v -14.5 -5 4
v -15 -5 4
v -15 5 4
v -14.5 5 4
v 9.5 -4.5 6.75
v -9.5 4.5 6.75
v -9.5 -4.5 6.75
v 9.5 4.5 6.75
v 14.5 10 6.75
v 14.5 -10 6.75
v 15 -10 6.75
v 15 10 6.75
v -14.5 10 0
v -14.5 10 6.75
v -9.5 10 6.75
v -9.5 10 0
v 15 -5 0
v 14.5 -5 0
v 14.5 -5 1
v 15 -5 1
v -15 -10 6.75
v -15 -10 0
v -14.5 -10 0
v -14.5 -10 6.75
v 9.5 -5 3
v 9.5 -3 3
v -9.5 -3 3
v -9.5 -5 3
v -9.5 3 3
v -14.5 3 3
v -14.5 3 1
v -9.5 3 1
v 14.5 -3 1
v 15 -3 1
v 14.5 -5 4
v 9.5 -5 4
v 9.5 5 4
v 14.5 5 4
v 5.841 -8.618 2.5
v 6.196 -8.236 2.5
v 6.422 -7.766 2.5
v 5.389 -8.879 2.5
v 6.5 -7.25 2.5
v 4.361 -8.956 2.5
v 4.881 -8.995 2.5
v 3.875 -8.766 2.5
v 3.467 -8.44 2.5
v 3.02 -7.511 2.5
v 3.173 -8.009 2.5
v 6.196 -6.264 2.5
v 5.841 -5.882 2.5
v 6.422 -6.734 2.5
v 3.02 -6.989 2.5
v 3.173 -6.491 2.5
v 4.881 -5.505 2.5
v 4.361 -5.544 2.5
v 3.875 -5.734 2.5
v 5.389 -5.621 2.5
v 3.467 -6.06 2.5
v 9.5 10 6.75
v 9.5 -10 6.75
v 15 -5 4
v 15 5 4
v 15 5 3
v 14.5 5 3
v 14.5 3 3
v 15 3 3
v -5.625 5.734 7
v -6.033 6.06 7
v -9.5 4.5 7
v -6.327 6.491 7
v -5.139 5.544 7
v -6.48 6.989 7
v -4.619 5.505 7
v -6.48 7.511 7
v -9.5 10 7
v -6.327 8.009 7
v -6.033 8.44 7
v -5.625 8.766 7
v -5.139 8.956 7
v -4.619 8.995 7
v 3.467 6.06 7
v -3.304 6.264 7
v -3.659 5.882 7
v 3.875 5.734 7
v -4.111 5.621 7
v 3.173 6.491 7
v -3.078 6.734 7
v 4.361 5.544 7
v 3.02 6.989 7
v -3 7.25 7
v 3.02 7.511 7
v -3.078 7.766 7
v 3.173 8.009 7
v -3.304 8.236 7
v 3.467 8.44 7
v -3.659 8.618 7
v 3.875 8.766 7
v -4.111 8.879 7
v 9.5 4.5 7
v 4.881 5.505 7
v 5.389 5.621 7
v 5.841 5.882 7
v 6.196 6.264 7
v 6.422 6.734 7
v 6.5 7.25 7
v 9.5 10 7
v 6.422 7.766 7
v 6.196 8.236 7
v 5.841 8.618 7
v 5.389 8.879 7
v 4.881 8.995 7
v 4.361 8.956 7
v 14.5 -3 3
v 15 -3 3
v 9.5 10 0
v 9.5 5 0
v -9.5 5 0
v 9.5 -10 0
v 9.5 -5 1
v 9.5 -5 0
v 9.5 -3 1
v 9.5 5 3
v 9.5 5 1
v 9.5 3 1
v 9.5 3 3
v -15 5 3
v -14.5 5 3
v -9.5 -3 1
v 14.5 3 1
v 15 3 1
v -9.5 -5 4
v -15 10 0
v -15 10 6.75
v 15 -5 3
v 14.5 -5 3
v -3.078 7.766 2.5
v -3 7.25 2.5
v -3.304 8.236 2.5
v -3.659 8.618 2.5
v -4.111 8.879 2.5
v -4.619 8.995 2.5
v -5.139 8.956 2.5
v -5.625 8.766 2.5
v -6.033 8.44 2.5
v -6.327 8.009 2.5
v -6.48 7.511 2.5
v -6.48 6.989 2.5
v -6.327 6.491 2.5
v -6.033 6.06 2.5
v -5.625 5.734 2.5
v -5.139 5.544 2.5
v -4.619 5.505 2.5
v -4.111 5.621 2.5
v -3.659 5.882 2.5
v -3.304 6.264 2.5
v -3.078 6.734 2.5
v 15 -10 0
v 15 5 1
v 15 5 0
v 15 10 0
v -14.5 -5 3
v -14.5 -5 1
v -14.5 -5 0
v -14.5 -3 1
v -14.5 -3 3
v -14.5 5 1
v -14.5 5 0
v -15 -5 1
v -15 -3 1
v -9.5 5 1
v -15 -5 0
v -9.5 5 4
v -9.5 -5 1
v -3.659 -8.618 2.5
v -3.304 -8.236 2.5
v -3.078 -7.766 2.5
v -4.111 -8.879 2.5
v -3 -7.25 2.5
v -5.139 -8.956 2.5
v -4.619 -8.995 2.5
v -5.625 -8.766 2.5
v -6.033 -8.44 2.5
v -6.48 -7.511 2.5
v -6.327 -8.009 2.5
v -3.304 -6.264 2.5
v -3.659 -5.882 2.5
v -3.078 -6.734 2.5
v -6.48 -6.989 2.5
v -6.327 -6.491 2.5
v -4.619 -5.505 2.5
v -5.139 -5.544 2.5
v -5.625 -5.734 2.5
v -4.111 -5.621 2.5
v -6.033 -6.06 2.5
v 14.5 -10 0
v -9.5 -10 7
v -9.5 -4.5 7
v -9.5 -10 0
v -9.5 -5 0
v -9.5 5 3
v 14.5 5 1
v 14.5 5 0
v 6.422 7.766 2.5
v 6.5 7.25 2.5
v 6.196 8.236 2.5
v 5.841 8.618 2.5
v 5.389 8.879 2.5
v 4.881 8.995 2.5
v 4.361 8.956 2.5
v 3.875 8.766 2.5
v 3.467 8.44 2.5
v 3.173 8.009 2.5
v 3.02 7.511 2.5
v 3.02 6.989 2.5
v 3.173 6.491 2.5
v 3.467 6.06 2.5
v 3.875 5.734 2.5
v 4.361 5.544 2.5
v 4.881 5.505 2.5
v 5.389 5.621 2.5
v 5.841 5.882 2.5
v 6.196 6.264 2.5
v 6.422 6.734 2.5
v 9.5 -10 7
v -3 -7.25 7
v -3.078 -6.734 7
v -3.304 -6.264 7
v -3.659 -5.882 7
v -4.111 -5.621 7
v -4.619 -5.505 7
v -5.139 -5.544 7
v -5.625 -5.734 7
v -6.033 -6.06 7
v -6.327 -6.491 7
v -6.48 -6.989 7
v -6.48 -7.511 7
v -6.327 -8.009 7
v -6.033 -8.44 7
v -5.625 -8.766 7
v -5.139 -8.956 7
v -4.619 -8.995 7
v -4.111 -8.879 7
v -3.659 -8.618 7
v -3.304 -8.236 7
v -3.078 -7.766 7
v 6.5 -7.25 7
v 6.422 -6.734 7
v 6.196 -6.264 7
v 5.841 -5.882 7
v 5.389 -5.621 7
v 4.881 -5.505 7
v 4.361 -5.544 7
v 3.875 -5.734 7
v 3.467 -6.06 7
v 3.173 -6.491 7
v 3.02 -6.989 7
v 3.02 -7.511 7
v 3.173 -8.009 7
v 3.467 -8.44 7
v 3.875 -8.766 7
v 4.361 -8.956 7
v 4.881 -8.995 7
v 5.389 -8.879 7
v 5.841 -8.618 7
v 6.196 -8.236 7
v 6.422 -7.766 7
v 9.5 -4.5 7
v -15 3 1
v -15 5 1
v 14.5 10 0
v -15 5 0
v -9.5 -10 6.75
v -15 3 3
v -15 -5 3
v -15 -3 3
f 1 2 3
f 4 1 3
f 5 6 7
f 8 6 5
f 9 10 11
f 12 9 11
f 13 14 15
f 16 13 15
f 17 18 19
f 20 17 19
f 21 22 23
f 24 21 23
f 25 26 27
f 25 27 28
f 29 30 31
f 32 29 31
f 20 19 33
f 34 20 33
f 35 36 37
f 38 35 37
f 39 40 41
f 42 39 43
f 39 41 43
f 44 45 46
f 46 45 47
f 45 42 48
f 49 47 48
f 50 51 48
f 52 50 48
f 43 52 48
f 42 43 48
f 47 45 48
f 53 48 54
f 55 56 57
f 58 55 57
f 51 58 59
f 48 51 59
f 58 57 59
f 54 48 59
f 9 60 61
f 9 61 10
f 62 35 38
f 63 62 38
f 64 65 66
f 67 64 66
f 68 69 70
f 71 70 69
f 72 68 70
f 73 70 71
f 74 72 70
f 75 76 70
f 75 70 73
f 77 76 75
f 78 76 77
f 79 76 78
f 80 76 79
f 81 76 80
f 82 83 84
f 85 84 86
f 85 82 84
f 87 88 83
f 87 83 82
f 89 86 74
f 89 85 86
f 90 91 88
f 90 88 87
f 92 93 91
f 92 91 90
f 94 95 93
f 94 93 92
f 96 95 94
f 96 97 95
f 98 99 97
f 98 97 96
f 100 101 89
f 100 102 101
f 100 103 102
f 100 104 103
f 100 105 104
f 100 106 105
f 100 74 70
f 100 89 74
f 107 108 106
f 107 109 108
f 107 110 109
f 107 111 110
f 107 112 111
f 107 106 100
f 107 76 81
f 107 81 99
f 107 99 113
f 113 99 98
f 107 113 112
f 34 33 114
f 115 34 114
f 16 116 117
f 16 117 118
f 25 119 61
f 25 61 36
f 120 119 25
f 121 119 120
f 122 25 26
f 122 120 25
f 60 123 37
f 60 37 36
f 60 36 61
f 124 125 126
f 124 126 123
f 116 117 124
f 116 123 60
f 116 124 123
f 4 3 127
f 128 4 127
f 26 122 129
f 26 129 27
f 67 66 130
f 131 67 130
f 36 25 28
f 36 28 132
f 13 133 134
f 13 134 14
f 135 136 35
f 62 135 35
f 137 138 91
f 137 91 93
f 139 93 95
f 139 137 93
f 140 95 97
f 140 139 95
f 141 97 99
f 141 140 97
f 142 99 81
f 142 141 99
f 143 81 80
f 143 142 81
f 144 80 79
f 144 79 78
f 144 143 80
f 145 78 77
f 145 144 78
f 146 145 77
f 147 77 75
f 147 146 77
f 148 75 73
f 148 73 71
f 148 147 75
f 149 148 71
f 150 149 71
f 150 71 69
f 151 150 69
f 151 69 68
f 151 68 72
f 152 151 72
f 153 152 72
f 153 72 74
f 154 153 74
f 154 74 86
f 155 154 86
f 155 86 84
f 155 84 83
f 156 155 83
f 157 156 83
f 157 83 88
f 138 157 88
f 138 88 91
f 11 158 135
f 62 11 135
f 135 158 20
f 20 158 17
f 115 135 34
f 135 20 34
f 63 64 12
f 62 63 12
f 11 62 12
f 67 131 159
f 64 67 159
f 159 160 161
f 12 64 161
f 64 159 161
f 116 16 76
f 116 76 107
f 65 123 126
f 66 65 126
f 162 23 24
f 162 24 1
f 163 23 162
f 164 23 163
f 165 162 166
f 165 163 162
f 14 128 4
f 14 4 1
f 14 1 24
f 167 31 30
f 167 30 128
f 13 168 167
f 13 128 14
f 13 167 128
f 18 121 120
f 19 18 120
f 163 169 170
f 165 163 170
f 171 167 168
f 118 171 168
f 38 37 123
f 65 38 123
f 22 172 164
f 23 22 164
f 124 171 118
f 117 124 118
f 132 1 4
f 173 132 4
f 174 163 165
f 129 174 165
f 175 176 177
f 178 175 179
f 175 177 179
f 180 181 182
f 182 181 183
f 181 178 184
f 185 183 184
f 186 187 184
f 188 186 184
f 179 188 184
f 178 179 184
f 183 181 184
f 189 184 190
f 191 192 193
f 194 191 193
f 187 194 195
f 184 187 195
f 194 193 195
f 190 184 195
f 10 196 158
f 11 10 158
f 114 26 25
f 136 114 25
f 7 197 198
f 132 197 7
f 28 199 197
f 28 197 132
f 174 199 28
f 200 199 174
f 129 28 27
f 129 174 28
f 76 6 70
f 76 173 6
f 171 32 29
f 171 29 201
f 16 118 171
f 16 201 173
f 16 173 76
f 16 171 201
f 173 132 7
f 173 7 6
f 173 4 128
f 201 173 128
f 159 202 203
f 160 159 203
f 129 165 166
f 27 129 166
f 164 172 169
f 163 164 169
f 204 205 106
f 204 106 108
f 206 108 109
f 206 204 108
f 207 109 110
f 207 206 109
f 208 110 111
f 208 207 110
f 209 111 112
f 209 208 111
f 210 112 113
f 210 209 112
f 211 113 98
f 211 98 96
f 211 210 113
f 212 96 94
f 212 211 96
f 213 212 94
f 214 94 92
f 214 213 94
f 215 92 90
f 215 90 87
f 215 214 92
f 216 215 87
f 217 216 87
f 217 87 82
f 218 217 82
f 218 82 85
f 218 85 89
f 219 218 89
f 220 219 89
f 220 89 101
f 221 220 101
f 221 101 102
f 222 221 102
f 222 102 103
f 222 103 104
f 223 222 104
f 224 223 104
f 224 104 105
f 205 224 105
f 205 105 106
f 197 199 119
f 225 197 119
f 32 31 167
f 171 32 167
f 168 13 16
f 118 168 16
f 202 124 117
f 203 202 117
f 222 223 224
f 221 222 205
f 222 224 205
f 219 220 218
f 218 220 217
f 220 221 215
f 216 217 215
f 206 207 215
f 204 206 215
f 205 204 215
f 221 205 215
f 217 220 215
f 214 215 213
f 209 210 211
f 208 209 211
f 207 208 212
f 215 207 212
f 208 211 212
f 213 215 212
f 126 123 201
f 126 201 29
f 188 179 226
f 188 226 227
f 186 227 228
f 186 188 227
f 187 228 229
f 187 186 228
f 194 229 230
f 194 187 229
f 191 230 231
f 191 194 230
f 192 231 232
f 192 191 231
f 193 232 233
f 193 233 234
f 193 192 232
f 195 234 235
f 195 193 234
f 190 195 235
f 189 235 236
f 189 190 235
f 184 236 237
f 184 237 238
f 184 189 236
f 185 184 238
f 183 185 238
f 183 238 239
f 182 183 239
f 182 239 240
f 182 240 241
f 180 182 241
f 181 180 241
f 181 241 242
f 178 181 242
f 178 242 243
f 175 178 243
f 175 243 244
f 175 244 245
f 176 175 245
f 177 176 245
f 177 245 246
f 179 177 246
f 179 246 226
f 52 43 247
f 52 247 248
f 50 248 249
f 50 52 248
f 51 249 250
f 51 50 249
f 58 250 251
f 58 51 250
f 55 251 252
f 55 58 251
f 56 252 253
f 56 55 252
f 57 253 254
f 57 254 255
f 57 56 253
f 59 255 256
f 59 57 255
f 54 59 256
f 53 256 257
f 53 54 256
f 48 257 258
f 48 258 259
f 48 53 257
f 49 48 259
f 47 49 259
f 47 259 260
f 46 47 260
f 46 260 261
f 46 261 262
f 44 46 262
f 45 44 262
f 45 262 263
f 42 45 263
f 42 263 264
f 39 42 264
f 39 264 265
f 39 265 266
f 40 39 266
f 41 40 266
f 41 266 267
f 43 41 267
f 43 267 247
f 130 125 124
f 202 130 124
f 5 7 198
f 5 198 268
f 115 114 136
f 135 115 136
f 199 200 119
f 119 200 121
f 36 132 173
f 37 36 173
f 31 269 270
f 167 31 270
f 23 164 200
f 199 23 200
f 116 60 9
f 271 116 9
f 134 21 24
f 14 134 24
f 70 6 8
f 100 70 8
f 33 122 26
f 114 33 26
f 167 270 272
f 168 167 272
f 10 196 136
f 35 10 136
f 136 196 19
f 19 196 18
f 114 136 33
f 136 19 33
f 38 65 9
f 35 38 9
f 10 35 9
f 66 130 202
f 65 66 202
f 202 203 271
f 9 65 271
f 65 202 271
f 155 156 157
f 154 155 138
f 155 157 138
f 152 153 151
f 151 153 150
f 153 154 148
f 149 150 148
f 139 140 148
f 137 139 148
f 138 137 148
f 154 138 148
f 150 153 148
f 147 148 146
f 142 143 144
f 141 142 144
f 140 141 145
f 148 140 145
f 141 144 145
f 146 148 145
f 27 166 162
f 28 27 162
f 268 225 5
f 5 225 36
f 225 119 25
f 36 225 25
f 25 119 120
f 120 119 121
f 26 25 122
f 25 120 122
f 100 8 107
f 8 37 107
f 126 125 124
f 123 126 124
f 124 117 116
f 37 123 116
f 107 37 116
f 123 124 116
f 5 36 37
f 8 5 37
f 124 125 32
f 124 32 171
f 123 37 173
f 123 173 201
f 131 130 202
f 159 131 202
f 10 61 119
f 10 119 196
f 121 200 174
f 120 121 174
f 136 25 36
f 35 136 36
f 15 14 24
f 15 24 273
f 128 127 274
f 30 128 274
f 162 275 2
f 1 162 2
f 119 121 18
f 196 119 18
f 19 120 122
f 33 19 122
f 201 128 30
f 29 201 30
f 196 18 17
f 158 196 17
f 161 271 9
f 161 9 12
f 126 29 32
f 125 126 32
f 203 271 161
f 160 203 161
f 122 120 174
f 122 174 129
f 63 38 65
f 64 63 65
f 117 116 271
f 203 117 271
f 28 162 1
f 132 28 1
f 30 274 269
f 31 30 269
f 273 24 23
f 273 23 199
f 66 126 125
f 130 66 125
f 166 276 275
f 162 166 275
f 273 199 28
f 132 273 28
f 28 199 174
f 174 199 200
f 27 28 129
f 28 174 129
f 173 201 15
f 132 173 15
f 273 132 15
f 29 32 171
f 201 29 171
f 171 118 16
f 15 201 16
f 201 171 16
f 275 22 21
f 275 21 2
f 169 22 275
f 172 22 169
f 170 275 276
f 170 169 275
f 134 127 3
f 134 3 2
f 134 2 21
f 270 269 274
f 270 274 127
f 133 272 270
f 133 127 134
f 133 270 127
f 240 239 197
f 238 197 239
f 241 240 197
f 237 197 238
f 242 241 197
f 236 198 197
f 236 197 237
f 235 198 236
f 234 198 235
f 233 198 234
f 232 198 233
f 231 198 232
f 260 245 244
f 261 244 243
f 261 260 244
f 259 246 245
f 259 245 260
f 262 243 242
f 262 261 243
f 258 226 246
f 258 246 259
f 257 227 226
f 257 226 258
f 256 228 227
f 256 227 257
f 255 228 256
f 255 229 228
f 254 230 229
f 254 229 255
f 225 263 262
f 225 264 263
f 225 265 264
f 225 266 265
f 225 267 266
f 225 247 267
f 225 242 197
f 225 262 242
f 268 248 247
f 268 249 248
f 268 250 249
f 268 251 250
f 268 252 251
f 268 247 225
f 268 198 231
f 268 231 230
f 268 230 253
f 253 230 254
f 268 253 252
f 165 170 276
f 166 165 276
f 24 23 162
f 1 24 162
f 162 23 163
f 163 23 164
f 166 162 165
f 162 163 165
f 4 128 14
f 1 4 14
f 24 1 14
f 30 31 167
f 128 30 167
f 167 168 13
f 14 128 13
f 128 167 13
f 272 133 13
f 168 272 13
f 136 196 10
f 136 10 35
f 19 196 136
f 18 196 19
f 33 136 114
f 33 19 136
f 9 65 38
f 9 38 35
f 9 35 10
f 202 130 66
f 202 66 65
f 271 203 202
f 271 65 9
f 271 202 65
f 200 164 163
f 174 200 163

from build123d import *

# Parameters (mm, degrees)
ESQUISSE1_W             = 19
ESQUISSE1_H             = 5.5
ESQUISSE1_R             = 1.75
BOSS_EXTRU_1_DEPTH      = 7
BOSS_EXTRU_1_2_DEPTH    = 7
ESQUISSE1_3_W           = 19
ESQUISSE1_3_H           = 9
BOSS_EXTRU_2_DEPTH      = 6.75
ESQUISSE1_4_W           = 5
ESQUISSE1_4_H           = 20
BOSS_EXTRU_3_DEPTH      = 6.75
BOSS_EXTRU_3_2_DEPTH    = 6.75
ESQUISSE1_5_W           = 0.5
ESQUISSE1_5_H           = 20
BOSS_EXTRU_4_DEPTH      = 6.75
BOSS_EXTRU_4_2_DEPTH    = 6.75
ENL_V_MAT_EXTRU_1_DEPTH = 30
ESQUISSE4_R             = 1.75
BOSS_EXTRU_6_DEPTH      = 2.5


with BuildPart() as part:
    # Esquisse1 → Boss.-Extru.1 (new body)
    with BuildSketch(Plane.XY):
        with Locations((0, 7.25)):
            Rectangle(ESQUISSE1_W, ESQUISSE1_H)
        with Locations((-4.75, 7.25)):
            Circle(ESQUISSE1_R, mode=Mode.SUBTRACT)
        with Locations((4.75, 7.25)):
            Circle(ESQUISSE1_R, mode=Mode.SUBTRACT)
    extrude(amount=BOSS_EXTRU_1_DEPTH)



with BuildPart() as body_2:
    # Esquisse1 → Boss.-Extru.1 2 (new body)
    with BuildSketch(Plane.XY):
        with Locations((0, -7.25)):
            Rectangle(ESQUISSE1_W, ESQUISSE1_H)
        with Locations((-4.75, -7.25)):
            Circle(ESQUISSE1_R, mode=Mode.SUBTRACT)
        with Locations((4.75, -7.25)):
            Circle(ESQUISSE1_R, mode=Mode.SUBTRACT)
    extrude(amount=BOSS_EXTRU_1_2_DEPTH)


with BuildPart() as part_1:
    add(part.part)

    add(body_2.part)  # Boss.-Extru.2 merges body 2
    # Esquisse1<3> → Boss.-Extru.2 (add)
    with BuildSketch(Plane.XY):
        Rectangle(ESQUISSE1_3_W, ESQUISSE1_3_H)
    extrude(amount=BOSS_EXTRU_2_DEPTH)


with BuildPart() as body_2_2:
    # Esquisse1<4> → Boss.-Extru.3 (new body)
    with BuildSketch(Plane.XY):
        with Locations((-12, 0)):
            Rectangle(ESQUISSE1_4_W, ESQUISSE1_4_H)
    extrude(amount=BOSS_EXTRU_3_DEPTH)


with BuildPart() as body_3:
    # Esquisse1<4> → Boss.-Extru.3 2 (new body)
    with BuildSketch(Plane.XY):
        with Locations((12, 0)):
            Rectangle(ESQUISSE1_4_W, ESQUISSE1_4_H)
    extrude(amount=BOSS_EXTRU_3_2_DEPTH)


with BuildPart() as body_4:
    # Esquisse1<5> → Boss.-Extru.4 (new body)
    with BuildSketch(Plane.XY):
        with Locations((-14.75, 0)):
            Rectangle(ESQUISSE1_5_W, ESQUISSE1_5_H)
    extrude(amount=BOSS_EXTRU_4_DEPTH)


with BuildPart() as body_5:
    # Esquisse1<5> → Boss.-Extru.4 2 (new body)
    with BuildSketch(Plane.XY):
        with Locations((14.75, 0)):
            Rectangle(ESQUISSE1_5_W, ESQUISSE1_5_H)
    extrude(amount=BOSS_EXTRU_4_2_DEPTH)


with BuildPart() as enl_v_mat_extru_1_tool:
    # Esquisse2 → Enlèv. mat.-Extru.1 (new body)
    with BuildSketch(Plane.ZY.offset(15)):
        Polygon((3, -5), (4, -5), (4, 5), (3, 5), (3, 3), (1, 3), (1, 5), (0, 5), (0, -5), (1, -5), (1, -3), (3, -3), align=None)
    extrude(amount=-ENL_V_MAT_EXTRU_1_DEPTH)


with BuildPart() as part_2:
    add(part_1.part)

    # Enlèv. mat.-Extru.1: cut by enl_v_mat_extru_1_tool
    add(enl_v_mat_extru_1_tool.part, mode=Mode.SUBTRACT)

    # Esquisse4 → Boss.-Extru.6 (add)
    with BuildSketch(Plane(origin=(0, 0, 0), x_dir=(-1, 0, 0), z_dir=(0, 0, -1))):
        with Locations((-4.75, 7.25)):
            Circle(ESQUISSE4_R)
        with Locations((4.75, 7.25)):
            Circle(ESQUISSE4_R)
        with Locations((4.75, -7.25)):
            Circle(ESQUISSE4_R)
        with Locations((-4.75, -7.25)):
            Circle(ESQUISSE4_R)
    extrude(amount=-BOSS_EXTRU_6_DEPTH)


with BuildPart() as body_2_2_1:
    add(body_2_2.part)

    # Enlèv. mat.-Extru.1: cut by enl_v_mat_extru_1_tool
    add(enl_v_mat_extru_1_tool.part, mode=Mode.SUBTRACT)


with BuildPart() as body_3_1:
    add(body_3.part)

    # Enlèv. mat.-Extru.1: cut by enl_v_mat_extru_1_tool
    add(enl_v_mat_extru_1_tool.part, mode=Mode.SUBTRACT)


with BuildPart() as body_4_1:
    add(body_4.part)

    # Enlèv. mat.-Extru.1: cut by enl_v_mat_extru_1_tool
    add(enl_v_mat_extru_1_tool.part, mode=Mode.SUBTRACT)


with BuildPart() as body_5_1:
    add(body_5.part)

    # Enlèv. mat.-Extru.1: cut by enl_v_mat_extru_1_tool
    add(enl_v_mat_extru_1_tool.part, mode=Mode.SUBTRACT)


solid = Compound([part_2.part, body_2_2_1.part, body_3_1.part, body_4_1.part, body_5_1.part])
